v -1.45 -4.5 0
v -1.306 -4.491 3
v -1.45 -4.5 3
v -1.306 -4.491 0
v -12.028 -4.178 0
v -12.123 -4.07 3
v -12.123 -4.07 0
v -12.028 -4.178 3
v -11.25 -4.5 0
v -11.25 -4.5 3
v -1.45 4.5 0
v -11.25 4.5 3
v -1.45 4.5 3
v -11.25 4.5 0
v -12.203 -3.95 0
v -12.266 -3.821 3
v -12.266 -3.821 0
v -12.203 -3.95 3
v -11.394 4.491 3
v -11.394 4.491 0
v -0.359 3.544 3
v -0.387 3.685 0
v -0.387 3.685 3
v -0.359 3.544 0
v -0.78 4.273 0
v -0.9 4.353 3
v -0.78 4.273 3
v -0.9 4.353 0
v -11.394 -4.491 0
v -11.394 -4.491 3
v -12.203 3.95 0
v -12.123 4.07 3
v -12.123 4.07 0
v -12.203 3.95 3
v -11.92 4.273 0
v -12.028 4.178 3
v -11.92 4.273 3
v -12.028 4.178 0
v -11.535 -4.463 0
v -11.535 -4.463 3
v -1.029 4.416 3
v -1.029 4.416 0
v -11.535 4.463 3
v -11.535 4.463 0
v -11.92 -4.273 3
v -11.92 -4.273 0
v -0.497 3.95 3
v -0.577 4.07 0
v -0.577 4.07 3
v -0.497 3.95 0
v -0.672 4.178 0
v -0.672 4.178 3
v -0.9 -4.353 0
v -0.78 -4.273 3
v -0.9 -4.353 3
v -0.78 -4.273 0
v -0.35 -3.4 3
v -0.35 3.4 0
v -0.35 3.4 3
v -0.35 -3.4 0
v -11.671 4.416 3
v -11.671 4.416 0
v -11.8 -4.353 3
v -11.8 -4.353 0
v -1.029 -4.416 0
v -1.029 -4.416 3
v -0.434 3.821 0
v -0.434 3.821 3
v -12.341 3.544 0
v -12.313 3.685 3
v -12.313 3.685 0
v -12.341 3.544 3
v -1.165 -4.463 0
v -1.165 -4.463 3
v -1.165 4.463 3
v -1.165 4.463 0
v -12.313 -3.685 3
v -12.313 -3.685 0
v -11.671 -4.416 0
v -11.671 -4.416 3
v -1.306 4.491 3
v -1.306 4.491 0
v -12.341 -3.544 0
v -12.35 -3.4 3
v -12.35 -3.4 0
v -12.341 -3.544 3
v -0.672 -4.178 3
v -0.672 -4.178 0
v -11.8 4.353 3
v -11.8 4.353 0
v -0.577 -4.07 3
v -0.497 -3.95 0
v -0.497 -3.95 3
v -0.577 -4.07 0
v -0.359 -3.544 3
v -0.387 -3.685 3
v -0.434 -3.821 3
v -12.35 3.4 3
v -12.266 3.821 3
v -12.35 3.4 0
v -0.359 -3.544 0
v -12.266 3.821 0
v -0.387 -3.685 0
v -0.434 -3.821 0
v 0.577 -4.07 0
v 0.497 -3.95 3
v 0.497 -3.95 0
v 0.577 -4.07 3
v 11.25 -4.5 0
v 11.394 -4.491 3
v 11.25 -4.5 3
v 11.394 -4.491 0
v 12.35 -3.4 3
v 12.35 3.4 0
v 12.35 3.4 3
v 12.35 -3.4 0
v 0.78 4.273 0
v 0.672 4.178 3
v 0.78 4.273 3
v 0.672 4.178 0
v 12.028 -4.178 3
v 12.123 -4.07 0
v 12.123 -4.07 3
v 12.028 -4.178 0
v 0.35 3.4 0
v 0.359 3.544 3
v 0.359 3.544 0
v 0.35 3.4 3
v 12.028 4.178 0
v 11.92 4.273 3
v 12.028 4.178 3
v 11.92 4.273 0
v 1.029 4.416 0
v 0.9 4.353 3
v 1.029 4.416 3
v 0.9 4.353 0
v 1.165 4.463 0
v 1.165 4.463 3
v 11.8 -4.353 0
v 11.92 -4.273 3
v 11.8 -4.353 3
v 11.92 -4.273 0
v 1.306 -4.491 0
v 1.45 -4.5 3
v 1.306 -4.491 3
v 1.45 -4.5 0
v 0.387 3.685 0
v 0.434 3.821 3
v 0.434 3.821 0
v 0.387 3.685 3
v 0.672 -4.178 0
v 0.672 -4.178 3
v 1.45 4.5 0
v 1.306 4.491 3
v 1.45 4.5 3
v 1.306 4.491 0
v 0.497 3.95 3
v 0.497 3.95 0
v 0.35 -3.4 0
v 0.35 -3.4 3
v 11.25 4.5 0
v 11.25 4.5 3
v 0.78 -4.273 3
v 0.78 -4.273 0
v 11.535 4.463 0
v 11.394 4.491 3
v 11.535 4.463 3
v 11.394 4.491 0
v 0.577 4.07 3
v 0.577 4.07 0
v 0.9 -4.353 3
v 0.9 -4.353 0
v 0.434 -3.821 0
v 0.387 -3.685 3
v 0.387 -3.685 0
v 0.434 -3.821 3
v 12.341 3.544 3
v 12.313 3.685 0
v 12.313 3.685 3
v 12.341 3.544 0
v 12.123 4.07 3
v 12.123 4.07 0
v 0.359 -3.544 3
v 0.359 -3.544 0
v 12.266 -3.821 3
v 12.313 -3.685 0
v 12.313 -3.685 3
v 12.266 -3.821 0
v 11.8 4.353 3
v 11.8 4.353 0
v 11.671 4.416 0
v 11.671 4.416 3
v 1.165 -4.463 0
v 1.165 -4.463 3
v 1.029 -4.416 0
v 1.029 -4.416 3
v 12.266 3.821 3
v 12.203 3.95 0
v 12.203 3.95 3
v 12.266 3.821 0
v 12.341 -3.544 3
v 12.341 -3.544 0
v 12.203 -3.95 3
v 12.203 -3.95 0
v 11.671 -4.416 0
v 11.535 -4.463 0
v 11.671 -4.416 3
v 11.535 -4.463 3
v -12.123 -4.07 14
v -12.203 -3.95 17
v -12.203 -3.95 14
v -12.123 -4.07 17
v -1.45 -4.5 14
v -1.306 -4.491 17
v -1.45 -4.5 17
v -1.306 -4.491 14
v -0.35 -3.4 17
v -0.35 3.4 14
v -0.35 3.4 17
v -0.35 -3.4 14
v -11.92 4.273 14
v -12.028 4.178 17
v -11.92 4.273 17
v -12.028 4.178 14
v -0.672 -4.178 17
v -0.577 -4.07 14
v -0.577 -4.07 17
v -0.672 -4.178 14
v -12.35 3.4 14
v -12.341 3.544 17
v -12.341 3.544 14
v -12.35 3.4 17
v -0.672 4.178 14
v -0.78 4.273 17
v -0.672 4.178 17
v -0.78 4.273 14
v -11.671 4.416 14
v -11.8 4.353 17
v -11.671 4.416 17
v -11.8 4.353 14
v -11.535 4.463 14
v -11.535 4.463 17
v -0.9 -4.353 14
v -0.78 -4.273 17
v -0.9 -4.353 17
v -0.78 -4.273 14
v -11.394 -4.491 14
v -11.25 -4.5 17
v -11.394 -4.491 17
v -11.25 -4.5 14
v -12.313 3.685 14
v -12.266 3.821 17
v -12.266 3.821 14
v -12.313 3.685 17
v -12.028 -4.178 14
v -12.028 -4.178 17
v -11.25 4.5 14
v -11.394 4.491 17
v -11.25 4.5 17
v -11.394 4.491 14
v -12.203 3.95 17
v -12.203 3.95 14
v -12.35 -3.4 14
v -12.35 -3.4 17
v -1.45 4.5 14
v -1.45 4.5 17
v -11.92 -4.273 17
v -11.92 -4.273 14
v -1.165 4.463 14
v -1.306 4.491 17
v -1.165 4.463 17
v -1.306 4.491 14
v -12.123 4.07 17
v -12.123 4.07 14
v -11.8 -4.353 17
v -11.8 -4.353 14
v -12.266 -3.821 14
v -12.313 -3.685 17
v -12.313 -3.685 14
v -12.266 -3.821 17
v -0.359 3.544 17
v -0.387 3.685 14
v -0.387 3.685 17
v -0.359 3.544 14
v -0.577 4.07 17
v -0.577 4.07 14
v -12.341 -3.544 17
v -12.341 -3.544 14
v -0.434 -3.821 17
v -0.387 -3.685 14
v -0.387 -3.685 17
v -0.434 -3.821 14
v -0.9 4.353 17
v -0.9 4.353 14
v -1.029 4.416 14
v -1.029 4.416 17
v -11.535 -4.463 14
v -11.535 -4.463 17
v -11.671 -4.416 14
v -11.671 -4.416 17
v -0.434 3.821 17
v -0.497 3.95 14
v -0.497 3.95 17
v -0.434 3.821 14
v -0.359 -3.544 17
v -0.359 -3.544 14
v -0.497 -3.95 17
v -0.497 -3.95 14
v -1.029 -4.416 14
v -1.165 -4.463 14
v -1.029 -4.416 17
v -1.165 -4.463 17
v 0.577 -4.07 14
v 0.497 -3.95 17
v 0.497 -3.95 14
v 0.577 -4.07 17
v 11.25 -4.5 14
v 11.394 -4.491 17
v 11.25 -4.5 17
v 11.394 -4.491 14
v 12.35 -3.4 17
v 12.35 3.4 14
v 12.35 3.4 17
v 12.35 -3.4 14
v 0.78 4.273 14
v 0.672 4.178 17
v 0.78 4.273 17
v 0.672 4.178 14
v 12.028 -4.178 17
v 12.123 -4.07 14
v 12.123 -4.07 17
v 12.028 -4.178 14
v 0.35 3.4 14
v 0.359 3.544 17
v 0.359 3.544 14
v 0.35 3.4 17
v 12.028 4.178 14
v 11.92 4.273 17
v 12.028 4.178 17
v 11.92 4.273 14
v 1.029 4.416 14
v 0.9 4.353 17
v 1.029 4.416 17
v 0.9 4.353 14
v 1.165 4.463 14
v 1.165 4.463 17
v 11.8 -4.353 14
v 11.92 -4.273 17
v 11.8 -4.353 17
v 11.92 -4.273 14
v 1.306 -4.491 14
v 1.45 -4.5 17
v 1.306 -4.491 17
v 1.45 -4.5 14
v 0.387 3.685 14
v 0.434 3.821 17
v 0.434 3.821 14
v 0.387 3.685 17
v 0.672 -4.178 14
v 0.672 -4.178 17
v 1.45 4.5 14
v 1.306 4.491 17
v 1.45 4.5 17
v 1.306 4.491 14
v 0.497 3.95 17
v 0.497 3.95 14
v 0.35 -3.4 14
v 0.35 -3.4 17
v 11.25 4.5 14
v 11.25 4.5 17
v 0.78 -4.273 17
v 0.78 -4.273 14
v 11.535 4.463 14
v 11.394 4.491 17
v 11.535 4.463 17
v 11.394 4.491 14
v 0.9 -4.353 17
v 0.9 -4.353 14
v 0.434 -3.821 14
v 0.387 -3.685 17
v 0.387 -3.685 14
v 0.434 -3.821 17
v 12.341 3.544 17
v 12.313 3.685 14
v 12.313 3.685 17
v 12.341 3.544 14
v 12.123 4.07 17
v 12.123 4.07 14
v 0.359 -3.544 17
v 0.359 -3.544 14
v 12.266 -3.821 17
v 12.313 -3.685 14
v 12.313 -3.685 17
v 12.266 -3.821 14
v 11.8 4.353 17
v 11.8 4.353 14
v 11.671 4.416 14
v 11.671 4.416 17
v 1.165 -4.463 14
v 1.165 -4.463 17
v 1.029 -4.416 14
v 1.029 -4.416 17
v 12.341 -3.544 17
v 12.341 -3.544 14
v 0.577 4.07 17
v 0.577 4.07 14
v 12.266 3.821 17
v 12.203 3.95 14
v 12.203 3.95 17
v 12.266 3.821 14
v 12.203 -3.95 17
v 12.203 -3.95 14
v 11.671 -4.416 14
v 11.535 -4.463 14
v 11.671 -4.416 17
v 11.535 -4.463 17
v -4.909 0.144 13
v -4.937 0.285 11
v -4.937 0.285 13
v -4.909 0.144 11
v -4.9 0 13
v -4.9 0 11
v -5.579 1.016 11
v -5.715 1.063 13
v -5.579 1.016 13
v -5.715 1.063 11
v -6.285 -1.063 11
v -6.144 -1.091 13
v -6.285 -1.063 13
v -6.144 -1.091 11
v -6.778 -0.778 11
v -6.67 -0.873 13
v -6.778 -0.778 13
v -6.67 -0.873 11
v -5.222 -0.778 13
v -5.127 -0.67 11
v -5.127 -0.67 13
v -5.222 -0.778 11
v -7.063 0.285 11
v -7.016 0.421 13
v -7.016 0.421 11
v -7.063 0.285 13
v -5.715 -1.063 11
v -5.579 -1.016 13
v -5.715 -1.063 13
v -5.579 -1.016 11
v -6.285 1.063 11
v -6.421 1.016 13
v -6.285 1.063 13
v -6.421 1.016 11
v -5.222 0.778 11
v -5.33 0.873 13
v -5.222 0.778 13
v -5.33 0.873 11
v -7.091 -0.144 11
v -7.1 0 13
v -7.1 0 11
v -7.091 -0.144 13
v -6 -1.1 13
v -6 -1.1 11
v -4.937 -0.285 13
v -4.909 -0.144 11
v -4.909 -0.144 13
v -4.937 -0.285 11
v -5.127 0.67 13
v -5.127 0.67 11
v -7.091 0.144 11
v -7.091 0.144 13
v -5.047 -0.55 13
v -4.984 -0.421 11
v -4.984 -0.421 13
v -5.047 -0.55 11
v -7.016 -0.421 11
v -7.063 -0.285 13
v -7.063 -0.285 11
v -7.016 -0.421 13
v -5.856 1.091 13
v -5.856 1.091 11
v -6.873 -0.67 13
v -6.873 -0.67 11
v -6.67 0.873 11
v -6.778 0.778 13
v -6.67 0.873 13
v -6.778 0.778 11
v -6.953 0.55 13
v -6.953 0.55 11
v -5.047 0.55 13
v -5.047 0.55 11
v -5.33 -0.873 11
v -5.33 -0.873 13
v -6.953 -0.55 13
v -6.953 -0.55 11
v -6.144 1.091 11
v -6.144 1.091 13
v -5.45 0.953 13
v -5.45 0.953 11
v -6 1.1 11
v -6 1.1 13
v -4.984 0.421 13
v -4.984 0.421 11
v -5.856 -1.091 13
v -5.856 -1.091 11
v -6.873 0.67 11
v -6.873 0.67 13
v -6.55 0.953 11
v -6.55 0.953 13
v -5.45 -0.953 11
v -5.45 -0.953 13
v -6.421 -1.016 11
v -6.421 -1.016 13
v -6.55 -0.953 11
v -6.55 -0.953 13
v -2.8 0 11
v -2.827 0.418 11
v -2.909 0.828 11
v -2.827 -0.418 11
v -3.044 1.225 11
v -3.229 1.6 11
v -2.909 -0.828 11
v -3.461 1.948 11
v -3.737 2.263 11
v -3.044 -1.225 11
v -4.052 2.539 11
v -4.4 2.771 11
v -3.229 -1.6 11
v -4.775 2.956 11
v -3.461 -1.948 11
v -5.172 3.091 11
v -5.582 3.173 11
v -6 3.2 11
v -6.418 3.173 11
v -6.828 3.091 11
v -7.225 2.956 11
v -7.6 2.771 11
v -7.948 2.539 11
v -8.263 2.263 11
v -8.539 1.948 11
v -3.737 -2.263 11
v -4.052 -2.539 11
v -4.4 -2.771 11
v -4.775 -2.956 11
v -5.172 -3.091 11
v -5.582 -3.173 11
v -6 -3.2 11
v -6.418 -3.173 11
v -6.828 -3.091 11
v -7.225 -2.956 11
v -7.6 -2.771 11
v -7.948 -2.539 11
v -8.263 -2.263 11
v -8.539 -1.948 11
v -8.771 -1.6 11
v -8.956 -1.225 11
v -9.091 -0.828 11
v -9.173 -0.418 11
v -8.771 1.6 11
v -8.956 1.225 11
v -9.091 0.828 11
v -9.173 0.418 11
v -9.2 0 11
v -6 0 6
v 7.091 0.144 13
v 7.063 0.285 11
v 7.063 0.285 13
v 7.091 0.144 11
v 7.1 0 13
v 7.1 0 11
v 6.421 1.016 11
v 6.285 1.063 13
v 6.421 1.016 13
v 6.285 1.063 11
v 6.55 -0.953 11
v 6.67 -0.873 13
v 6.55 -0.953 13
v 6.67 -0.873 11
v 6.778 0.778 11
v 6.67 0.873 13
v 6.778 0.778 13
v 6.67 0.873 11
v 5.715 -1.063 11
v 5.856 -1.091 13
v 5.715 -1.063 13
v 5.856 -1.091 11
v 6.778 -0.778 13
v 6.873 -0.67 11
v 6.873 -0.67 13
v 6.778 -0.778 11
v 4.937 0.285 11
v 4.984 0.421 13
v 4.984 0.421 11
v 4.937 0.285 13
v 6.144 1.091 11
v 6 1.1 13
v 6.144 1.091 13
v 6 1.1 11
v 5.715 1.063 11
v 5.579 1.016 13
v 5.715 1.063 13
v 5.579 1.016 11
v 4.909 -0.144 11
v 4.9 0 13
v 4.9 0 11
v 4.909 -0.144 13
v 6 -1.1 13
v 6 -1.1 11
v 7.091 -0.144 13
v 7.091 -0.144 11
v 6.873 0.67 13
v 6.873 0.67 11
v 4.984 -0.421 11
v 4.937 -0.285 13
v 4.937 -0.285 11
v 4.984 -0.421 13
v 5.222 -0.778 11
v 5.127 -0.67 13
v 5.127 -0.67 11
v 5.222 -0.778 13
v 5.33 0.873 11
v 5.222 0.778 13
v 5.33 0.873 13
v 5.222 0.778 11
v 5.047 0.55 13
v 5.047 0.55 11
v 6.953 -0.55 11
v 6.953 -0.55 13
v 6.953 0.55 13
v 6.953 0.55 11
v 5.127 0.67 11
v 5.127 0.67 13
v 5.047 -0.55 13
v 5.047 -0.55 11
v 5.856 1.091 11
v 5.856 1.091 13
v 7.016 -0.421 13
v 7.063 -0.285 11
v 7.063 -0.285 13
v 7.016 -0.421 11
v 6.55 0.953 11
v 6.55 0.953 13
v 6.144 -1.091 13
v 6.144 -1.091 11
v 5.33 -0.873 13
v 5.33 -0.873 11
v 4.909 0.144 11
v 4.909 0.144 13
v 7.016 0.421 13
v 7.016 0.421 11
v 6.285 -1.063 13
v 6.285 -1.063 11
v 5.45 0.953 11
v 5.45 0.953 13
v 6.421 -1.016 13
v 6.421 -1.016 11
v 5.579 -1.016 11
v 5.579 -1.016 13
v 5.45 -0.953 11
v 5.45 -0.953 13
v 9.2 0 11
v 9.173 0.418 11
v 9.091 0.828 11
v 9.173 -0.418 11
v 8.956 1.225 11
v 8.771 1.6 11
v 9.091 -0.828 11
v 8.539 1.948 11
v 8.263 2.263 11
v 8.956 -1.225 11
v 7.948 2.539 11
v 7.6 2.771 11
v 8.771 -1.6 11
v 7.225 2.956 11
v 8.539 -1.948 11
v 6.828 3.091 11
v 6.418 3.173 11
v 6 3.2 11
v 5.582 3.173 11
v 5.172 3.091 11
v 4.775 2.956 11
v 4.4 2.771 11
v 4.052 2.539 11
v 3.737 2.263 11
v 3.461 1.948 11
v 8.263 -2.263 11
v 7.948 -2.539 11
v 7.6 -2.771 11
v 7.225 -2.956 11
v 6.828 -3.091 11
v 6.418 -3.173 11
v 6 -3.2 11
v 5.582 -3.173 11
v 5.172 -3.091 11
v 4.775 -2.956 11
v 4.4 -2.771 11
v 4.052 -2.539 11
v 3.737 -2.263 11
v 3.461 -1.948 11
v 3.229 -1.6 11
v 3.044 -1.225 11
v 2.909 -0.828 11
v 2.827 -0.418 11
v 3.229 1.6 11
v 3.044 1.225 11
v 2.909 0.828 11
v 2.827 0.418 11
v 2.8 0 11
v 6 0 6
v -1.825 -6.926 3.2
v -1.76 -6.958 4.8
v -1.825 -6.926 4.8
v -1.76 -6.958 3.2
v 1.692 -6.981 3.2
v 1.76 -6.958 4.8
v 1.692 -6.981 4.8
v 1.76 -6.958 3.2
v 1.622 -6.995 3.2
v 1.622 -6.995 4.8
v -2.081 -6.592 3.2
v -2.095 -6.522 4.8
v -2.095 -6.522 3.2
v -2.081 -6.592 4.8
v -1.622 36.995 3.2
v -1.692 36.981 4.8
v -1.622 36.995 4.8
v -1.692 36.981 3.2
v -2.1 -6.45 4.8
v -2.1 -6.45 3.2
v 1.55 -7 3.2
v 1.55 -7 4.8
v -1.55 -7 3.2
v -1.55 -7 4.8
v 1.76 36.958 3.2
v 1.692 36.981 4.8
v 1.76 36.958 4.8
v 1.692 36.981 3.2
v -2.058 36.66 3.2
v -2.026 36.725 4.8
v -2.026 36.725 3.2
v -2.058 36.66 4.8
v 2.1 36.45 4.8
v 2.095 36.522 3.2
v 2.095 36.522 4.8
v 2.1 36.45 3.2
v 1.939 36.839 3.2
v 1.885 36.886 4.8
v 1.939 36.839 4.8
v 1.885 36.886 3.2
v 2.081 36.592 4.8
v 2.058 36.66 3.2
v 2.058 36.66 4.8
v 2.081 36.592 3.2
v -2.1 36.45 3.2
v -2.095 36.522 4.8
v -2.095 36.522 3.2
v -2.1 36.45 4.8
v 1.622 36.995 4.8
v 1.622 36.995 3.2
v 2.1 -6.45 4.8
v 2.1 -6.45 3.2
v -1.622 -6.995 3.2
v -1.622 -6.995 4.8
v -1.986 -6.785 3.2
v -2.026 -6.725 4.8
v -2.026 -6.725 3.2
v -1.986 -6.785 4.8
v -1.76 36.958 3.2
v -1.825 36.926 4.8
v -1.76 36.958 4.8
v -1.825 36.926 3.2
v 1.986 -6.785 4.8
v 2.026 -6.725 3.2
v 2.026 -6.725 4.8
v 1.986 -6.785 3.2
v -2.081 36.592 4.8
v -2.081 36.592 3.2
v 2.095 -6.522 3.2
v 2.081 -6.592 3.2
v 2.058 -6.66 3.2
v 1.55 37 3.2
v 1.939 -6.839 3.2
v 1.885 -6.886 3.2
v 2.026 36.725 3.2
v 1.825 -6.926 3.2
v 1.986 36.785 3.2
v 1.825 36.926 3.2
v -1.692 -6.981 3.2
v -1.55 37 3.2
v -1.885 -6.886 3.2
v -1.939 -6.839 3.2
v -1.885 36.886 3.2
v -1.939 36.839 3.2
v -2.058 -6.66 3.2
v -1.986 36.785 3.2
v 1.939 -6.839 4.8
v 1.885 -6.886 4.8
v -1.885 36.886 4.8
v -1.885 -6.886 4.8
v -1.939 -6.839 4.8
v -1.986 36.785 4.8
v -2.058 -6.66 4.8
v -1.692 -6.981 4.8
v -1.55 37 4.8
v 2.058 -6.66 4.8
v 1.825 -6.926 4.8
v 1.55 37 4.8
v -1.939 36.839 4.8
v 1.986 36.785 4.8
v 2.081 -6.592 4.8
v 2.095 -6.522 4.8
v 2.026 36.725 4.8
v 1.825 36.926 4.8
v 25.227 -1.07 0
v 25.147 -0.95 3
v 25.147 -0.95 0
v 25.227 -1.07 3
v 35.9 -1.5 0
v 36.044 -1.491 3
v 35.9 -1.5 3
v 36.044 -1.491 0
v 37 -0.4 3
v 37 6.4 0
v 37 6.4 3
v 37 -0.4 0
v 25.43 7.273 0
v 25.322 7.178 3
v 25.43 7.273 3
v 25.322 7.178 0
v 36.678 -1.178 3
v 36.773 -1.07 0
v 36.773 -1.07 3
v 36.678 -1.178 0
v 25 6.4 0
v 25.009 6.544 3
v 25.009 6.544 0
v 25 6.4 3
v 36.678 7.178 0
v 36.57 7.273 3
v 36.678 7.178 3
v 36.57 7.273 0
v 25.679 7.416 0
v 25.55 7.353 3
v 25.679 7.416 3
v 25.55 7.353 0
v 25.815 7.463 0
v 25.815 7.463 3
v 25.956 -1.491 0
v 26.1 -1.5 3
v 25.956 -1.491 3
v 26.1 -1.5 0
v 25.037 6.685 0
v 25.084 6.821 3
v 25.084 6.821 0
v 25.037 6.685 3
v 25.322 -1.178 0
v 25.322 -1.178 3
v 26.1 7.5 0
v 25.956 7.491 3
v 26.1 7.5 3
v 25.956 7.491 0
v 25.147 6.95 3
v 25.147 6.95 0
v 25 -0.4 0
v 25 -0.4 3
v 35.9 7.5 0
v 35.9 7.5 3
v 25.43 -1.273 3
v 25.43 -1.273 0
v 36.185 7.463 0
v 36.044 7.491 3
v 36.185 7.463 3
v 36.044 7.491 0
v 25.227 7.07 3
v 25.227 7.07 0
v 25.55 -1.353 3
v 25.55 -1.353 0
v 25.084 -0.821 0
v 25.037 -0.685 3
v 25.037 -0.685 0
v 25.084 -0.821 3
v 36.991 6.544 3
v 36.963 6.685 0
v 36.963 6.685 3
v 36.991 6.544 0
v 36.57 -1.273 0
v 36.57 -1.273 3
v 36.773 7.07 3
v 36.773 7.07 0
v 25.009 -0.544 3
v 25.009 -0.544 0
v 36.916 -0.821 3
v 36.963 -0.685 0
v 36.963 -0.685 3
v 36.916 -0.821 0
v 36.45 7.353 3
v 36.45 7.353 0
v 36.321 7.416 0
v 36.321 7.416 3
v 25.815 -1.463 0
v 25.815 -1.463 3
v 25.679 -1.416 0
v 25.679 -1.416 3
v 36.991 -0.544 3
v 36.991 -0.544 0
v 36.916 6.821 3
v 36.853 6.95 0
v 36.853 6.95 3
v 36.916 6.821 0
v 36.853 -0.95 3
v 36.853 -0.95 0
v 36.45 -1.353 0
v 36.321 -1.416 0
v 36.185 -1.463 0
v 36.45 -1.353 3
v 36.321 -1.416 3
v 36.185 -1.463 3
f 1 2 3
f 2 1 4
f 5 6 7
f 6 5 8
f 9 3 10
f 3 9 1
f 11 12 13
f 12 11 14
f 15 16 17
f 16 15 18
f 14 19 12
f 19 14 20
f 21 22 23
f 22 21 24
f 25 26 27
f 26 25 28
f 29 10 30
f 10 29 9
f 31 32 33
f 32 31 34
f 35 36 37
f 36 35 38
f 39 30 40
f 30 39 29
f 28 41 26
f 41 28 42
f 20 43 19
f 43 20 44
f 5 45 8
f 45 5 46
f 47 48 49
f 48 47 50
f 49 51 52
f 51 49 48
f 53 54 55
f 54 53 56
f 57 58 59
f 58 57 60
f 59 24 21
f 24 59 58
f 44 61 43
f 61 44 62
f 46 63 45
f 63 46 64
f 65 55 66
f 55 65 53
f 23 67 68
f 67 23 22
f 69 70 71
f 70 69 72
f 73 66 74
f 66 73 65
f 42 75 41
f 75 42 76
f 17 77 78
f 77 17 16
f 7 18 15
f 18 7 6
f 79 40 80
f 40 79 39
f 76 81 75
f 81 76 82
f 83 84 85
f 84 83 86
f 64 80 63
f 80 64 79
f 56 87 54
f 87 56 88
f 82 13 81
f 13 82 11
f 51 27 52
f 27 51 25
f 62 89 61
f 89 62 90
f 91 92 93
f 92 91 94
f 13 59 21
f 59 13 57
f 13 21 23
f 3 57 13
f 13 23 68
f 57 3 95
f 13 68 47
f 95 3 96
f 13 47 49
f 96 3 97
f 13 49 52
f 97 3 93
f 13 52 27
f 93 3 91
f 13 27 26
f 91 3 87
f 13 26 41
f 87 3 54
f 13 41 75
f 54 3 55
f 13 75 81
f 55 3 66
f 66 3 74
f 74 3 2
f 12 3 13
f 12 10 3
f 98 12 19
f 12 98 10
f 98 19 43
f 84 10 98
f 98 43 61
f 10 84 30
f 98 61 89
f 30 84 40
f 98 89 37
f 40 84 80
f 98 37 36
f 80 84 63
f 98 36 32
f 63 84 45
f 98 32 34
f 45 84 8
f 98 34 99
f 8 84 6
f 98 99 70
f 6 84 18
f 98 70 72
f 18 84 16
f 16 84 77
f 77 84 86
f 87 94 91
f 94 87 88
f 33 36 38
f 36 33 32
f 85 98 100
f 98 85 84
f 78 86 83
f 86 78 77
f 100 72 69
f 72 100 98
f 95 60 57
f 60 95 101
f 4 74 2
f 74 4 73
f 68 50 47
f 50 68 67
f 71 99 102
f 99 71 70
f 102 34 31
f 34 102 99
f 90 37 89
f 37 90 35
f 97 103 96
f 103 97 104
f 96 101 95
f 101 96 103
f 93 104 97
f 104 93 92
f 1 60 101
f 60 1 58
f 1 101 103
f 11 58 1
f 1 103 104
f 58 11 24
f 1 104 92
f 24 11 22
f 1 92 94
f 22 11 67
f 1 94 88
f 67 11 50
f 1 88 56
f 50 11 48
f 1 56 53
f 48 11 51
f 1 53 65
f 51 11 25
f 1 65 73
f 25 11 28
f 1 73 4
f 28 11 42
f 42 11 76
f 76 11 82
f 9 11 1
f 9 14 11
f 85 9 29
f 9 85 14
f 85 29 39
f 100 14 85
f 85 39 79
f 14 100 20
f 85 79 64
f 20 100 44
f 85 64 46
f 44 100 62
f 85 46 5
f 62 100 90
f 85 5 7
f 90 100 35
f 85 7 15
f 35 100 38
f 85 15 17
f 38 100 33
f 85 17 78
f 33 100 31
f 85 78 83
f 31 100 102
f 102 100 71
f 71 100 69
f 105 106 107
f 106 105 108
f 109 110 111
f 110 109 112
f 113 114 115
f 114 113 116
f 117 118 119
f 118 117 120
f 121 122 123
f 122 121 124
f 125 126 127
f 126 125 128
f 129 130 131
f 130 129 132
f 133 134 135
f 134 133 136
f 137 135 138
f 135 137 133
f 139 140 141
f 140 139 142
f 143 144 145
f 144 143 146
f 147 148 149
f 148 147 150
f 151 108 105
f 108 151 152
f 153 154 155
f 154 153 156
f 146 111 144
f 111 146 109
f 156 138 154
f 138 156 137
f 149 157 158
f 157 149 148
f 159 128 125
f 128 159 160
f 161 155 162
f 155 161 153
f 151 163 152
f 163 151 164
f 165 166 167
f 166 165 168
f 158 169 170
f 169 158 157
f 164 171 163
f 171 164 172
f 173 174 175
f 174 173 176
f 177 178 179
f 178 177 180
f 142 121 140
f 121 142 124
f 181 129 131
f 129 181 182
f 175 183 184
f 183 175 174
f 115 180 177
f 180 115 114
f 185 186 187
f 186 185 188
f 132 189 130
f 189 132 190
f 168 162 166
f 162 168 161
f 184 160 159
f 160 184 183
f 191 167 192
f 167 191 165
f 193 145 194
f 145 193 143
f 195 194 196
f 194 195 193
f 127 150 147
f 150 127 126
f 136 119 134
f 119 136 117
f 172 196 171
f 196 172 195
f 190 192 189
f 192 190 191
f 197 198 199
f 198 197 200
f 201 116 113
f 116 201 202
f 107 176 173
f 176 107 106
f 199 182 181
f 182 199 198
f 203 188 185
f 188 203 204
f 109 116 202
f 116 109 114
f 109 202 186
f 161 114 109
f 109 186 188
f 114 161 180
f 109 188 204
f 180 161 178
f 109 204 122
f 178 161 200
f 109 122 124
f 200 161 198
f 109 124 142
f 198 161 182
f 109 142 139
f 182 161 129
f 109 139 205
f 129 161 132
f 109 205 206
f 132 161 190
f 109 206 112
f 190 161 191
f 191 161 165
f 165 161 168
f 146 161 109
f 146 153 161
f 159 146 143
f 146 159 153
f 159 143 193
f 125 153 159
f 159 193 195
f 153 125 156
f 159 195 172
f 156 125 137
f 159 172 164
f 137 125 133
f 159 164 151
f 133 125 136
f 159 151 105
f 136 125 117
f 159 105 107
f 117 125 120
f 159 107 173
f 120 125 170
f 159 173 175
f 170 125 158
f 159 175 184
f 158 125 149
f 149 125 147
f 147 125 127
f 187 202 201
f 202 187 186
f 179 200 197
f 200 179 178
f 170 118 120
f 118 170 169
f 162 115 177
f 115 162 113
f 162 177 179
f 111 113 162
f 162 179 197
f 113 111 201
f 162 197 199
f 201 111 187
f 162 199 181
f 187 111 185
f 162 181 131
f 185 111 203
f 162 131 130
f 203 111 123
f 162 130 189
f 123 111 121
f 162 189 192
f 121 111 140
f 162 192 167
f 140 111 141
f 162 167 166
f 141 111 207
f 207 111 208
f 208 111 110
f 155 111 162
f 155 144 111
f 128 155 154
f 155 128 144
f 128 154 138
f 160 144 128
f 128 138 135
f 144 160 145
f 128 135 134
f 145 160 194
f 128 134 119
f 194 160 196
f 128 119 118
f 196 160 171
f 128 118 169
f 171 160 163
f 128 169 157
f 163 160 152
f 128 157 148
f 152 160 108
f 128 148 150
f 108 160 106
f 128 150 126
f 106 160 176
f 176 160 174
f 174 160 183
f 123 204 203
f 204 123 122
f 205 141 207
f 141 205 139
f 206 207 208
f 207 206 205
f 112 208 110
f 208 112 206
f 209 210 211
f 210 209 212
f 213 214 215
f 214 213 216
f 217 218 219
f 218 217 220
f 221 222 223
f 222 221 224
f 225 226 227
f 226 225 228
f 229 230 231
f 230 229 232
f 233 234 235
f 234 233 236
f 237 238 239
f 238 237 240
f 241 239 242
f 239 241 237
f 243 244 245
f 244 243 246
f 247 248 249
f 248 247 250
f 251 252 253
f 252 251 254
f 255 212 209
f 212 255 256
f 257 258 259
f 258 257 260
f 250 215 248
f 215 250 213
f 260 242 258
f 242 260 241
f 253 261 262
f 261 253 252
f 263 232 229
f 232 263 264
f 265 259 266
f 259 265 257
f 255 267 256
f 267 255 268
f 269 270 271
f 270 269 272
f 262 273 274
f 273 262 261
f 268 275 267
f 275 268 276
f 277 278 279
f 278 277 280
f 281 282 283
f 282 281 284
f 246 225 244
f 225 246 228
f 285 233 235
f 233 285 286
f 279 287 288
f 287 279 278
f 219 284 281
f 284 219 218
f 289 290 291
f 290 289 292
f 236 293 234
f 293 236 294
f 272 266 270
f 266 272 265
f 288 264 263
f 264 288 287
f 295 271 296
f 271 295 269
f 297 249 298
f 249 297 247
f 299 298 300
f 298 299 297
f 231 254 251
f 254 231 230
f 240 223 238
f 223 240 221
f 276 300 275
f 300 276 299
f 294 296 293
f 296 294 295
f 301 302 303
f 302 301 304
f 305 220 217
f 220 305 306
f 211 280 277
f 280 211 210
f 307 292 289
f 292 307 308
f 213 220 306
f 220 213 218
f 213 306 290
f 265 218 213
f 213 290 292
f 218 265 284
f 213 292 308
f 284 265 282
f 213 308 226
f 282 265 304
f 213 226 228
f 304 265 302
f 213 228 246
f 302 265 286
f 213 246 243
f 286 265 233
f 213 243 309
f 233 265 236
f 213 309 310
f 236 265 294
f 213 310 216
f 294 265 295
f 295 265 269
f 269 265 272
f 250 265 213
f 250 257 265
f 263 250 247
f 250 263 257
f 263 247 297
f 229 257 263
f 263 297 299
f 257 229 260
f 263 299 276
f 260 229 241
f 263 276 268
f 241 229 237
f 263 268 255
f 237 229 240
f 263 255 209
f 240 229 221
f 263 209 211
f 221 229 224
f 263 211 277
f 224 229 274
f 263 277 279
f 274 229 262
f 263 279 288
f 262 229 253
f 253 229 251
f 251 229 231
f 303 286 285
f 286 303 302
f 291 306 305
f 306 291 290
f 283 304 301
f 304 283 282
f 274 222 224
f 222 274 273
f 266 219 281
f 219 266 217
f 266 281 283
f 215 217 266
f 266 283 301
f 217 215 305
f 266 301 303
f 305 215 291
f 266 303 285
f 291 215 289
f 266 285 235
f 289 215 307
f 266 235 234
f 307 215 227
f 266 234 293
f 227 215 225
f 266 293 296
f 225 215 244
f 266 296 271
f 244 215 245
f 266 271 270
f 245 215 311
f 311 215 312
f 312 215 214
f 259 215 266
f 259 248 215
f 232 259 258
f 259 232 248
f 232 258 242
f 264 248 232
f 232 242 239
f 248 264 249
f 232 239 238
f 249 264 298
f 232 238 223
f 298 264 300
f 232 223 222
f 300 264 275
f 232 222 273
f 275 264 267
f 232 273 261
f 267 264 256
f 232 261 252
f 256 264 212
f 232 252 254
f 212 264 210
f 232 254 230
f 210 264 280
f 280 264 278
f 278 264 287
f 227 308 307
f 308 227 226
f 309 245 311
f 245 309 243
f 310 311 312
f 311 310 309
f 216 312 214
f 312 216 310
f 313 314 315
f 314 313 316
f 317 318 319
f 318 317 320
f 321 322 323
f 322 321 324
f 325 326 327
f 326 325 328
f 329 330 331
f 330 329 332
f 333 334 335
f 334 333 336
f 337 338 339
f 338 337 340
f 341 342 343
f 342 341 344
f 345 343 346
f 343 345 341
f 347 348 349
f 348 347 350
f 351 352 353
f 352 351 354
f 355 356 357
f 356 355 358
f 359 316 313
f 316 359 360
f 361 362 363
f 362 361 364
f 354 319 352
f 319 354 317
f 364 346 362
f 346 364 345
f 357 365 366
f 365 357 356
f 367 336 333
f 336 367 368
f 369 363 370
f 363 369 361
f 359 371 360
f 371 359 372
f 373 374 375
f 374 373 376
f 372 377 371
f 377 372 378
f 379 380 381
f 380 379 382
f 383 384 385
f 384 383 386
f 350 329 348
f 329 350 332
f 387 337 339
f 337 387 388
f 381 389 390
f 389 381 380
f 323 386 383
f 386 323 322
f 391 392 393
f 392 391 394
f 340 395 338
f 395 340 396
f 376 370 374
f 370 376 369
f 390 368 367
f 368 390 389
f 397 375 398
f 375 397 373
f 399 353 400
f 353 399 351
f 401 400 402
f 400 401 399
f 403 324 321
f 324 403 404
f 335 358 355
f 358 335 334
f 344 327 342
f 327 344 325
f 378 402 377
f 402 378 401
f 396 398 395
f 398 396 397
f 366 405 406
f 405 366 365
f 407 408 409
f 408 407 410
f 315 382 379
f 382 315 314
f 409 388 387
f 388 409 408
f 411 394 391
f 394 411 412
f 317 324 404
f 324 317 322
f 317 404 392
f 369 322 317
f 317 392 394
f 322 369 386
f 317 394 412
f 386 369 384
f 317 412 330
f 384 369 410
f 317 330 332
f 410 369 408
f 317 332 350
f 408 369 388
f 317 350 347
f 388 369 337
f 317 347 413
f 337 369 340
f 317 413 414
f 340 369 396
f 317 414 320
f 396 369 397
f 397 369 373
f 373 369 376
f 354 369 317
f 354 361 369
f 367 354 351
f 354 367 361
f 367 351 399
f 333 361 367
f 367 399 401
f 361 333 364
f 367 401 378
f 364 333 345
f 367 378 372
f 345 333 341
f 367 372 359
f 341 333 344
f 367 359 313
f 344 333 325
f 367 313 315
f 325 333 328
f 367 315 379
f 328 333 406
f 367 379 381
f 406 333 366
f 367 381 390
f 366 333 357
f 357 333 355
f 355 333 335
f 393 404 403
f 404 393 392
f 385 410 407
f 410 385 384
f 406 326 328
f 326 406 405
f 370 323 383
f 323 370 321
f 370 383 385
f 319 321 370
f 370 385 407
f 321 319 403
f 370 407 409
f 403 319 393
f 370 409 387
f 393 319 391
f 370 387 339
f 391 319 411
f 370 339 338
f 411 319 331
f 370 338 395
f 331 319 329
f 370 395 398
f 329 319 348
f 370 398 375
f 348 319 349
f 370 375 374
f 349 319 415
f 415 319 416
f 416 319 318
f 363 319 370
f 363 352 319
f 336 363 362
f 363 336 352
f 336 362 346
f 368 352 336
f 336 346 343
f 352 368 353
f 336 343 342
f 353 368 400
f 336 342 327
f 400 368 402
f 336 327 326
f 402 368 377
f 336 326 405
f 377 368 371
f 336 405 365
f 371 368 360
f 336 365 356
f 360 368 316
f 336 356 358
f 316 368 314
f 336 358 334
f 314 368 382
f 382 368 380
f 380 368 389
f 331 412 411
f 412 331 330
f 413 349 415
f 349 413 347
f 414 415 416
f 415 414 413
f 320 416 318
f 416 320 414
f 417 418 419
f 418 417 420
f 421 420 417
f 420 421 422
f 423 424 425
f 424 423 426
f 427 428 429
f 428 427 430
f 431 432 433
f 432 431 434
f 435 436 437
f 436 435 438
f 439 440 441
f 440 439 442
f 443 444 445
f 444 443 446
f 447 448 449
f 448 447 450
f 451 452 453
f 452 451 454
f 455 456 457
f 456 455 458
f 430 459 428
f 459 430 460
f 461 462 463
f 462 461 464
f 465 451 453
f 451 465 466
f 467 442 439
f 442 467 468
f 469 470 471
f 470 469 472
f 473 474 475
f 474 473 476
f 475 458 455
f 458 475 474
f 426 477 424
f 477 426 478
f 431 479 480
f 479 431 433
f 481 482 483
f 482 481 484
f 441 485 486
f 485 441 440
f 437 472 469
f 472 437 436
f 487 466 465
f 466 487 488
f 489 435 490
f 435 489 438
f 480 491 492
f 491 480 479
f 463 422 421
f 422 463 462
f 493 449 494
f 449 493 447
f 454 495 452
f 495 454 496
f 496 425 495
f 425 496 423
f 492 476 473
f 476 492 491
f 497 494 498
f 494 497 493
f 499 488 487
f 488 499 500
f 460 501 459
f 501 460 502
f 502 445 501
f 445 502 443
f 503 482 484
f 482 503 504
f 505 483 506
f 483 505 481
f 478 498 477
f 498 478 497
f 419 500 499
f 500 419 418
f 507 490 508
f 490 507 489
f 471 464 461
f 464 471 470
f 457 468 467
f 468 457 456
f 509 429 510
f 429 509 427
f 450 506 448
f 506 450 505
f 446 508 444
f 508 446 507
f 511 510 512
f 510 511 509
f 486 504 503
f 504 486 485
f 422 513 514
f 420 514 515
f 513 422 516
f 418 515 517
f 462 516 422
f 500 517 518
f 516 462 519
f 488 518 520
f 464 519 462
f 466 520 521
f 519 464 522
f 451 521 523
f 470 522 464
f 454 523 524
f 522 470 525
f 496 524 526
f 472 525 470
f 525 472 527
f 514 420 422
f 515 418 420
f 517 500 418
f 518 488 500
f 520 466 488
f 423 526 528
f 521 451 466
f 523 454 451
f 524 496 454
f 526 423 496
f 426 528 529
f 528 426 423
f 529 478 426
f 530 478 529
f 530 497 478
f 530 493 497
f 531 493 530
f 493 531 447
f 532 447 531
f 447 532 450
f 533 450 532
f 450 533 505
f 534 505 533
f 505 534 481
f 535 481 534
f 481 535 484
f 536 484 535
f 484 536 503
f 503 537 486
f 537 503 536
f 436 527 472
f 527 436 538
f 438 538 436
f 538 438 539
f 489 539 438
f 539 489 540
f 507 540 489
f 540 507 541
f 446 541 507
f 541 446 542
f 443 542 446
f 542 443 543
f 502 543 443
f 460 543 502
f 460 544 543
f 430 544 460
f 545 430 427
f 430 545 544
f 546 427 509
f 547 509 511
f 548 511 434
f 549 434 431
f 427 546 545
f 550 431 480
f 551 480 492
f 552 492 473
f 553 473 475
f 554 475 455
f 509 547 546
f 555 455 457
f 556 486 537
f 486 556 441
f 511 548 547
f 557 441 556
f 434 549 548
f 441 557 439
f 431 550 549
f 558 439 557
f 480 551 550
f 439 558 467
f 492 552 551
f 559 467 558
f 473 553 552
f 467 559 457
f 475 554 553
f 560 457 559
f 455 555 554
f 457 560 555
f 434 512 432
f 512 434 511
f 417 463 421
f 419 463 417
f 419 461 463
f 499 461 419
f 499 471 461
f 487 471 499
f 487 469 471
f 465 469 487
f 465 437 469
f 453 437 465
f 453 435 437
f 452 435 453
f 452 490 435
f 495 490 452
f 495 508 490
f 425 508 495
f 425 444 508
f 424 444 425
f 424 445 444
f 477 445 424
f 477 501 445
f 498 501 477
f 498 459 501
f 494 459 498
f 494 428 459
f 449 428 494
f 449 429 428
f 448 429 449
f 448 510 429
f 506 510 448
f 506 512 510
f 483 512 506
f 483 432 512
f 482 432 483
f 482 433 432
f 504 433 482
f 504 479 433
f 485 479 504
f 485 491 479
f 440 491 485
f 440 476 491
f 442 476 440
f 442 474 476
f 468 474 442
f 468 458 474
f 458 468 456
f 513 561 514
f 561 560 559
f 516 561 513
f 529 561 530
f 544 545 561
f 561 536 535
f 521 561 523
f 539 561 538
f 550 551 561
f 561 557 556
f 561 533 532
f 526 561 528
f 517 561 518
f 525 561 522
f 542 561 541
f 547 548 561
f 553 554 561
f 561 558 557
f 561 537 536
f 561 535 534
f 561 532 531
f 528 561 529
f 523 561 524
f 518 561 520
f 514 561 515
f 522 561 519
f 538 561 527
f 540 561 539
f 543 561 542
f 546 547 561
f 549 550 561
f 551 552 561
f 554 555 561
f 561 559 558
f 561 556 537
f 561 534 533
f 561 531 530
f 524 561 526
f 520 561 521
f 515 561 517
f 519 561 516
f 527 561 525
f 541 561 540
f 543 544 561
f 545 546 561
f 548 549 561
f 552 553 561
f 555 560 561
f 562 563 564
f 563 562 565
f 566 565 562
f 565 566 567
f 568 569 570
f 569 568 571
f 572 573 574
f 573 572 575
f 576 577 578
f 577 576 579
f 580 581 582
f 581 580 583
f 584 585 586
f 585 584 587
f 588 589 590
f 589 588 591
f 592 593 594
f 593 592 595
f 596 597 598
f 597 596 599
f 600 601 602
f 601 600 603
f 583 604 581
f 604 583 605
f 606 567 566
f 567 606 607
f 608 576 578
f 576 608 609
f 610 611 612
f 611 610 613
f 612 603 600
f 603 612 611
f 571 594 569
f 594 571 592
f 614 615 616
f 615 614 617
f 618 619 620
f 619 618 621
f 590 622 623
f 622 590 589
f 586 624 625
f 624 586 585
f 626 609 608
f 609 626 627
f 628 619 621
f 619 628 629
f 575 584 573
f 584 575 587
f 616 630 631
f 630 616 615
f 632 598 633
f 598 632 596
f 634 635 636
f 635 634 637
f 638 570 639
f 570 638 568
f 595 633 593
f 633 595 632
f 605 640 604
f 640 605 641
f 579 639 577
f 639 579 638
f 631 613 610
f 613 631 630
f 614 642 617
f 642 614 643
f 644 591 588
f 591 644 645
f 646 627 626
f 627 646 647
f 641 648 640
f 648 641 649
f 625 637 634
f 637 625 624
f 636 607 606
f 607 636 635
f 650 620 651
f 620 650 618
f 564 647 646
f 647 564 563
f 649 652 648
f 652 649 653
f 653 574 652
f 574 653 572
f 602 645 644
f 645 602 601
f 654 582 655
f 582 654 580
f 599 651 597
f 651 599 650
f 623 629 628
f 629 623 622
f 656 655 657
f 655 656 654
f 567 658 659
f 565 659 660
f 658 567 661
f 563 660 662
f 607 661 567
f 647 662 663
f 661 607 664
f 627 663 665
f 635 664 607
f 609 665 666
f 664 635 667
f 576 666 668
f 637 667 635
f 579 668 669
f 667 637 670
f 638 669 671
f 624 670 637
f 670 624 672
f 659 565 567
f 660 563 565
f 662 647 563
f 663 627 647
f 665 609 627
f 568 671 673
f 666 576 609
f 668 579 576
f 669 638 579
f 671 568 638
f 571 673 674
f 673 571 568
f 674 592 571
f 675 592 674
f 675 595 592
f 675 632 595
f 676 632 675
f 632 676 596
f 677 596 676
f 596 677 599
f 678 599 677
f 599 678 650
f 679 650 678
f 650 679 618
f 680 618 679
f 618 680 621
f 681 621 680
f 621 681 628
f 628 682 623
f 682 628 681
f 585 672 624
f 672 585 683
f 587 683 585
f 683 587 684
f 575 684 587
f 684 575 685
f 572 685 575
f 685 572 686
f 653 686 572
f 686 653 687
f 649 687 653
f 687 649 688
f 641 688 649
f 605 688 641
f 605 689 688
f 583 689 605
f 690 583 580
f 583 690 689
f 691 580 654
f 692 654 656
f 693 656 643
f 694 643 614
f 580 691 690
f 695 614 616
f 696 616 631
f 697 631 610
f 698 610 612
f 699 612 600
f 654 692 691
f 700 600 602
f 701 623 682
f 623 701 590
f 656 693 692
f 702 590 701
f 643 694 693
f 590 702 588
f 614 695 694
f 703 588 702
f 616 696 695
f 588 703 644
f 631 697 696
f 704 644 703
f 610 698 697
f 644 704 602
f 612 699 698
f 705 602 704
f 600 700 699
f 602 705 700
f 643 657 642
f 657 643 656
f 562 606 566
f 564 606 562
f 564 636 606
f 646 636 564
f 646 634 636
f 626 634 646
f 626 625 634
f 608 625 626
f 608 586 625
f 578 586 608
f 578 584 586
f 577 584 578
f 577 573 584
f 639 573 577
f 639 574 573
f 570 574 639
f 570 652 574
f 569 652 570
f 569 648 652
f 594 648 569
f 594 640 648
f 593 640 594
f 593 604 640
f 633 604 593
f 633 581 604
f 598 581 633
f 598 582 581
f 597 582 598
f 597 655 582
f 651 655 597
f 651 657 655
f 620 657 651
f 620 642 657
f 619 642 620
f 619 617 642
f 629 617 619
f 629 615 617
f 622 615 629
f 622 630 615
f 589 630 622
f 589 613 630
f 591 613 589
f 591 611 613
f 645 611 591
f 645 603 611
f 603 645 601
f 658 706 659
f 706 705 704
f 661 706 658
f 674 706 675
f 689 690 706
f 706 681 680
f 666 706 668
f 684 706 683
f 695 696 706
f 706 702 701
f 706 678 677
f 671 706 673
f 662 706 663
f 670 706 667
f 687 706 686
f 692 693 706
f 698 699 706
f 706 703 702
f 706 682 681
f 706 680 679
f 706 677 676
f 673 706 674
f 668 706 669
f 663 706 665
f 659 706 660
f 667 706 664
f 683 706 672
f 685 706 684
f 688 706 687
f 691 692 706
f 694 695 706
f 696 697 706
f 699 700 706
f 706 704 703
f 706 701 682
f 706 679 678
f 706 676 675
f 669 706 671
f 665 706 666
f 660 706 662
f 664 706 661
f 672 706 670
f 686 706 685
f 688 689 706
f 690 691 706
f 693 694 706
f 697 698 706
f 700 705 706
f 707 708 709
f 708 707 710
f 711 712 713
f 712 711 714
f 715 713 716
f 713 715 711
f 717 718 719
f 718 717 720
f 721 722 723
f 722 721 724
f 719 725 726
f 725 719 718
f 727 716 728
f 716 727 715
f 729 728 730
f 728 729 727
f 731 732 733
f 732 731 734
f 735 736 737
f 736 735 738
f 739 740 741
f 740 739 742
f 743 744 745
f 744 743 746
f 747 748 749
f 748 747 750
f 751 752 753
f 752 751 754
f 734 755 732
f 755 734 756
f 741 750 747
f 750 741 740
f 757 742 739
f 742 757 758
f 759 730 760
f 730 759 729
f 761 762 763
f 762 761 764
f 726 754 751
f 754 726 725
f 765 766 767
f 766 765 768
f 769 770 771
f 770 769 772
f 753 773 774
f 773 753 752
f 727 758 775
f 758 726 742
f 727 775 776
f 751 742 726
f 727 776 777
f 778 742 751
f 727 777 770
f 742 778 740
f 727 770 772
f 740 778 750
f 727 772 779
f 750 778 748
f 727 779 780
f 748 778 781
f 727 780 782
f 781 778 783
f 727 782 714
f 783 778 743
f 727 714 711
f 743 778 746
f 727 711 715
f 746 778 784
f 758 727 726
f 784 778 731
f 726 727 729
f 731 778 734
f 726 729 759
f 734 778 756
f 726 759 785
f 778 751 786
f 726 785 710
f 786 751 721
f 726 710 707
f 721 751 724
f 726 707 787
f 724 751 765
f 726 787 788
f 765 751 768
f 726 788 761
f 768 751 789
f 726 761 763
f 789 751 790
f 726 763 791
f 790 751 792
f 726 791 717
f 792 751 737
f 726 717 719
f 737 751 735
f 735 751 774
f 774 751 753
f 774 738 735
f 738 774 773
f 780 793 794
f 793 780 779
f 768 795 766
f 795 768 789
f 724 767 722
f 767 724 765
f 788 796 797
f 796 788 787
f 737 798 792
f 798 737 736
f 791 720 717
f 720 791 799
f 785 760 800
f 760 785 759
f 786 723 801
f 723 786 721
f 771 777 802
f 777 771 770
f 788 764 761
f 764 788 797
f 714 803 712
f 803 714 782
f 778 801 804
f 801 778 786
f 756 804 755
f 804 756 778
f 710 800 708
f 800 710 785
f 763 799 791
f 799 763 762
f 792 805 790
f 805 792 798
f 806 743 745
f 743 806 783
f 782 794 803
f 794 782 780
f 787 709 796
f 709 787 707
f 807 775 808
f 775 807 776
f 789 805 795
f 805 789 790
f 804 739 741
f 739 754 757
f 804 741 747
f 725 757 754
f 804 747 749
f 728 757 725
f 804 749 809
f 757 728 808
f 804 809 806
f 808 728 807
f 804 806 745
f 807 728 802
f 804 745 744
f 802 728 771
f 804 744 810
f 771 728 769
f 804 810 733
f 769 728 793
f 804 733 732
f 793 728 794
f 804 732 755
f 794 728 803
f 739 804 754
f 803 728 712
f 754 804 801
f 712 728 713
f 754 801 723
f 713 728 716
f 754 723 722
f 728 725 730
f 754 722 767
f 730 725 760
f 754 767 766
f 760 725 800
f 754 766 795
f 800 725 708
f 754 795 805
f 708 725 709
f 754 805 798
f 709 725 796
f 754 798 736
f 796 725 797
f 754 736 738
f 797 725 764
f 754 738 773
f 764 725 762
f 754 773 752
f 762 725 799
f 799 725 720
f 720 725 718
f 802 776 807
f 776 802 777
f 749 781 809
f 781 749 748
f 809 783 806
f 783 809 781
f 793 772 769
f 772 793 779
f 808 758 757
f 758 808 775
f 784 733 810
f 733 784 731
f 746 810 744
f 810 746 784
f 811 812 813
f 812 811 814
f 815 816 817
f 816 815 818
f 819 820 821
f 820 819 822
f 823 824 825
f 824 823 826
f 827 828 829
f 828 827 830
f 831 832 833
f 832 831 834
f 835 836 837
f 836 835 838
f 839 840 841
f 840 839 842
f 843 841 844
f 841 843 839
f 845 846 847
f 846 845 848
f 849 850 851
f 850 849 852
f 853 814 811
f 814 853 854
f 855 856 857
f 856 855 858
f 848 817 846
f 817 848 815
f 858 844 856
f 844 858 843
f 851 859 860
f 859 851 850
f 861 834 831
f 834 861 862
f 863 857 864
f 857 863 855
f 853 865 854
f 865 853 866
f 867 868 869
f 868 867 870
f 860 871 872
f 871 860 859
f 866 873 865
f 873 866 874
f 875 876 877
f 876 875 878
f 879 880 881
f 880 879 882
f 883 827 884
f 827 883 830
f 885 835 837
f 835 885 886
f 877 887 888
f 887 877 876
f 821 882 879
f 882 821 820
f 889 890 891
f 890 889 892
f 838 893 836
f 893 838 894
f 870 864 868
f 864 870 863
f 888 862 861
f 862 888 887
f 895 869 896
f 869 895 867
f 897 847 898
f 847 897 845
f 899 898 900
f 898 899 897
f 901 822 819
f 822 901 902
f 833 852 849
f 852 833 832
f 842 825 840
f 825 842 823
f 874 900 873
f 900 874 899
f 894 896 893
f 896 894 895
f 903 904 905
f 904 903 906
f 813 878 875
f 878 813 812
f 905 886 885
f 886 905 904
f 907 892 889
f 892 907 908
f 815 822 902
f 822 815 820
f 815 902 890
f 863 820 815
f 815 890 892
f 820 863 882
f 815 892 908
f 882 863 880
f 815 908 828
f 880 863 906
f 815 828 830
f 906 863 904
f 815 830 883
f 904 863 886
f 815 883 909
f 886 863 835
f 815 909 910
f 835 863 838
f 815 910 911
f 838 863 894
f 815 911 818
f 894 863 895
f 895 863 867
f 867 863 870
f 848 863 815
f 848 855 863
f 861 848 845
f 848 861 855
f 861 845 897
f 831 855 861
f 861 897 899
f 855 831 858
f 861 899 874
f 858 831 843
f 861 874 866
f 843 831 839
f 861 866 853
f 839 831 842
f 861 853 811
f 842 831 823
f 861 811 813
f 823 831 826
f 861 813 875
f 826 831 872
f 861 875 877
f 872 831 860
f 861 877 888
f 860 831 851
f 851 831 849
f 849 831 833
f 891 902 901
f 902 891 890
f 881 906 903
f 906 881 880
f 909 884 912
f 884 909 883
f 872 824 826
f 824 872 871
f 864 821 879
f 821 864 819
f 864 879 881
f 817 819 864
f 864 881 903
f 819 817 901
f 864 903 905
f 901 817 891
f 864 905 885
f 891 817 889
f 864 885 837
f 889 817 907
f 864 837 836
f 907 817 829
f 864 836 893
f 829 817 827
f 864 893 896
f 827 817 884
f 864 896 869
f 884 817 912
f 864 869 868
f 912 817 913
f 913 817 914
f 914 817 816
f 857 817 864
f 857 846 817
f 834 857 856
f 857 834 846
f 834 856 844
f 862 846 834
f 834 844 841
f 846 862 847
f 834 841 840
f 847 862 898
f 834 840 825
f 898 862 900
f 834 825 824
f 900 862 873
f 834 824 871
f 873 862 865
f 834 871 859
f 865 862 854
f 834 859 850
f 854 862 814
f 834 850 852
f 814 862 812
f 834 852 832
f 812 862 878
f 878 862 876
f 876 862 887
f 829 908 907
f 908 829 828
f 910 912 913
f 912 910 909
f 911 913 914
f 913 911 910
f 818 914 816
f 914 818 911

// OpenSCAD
// file: weight-rig-common.scad
$fn = 48;

steel = [0.34, 0.38, 0.43];
steel_light = [0.52, 0.57, 0.64];
active_blue = [0.08, 0.38, 0.92];
birch = [0.79, 0.61, 0.36];
string_blue = [0.12, 0.45, 0.92];
cover_yellow = [0.96, 0.72, 0.10, 0.72];
frame_gray = [0.38, 0.41, 0.45];
receiver_yellow = [1.00, 0.63, 0.05];
ghost_blue = [0.10, 0.42, 0.92, 0.24];

module rounded_box(size=[12, 9, 3], radius=1.1) {
  linear_extrude(height=size[2])
    offset(r=radius)
      square([size[0]-2*radius, size[1]-2*radius], center=true);
}

module weight_segment(position=[0,0,0], tint=steel) {
  color(tint)
    translate(position)
      rounded_box([12, 9, 3], 1.1);
}

module weight_pair(position=[0,0,0], tint=steel) {
  weight_segment([position[0]-6.35, position[1], position[2]], tint);
  weight_segment([position[0]+6.35, position[1], position[2]], tint);
}

module birch_stick(position=[0,0,0], height=42, tint=birch) {
  color(tint)
    translate(position)
      rounded_box([4.2, height, 1.6], 0.55);
}

module string_segment(a=[0,0,0], b=[0,10,0], radius=0.7, tint=string_blue) {
  v = b-a;
  length = norm(v);
  axis = cross([0,0,1], v);
  angle = acos(v[2]/length);
  color(tint)
    translate(a)
      rotate(a=angle, v=axis)
        cylinder(h=length, r=radius);
}

module down_arrow(position=[0,0,0], length=16) {
  color([0.16,0.17,0.19]) {
    translate([position[0],position[1],position[2]+5]) cylinder(h=length-5, r=1.1);
    translate(position) cylinder(h=5, r1=0, r2=3.2);
  }
}

module five_weight_rig(position=[0,0,0], singleton_tint=steel_light) {
  translate(position) {
    weight_pair([0,0,0], steel);
    weight_pair([0,0,3.4], steel);
    birch_stick([0,14,1.7], 38);
    weight_segment([0,0,6.8], singleton_tint);
  }
}
// main file
include <weight-rig-common.scad>;

// Dedicated instruction scene: the four-weight sandwich is assembled around
// the broken end of the birch stick; the fifth weight is visibly reserved.
weight_pair([0,0,0], steel);
birch_stick([0,15,3.2], 44);
weight_pair([0,0,14], active_blue);
down_arrow([-6,0,6], 7);
down_arrow([6,0,6], 7);

// Reserved singleton, deliberately separated from the four-weight sandwich.
weight_segment([31,3,0], steel_light);
